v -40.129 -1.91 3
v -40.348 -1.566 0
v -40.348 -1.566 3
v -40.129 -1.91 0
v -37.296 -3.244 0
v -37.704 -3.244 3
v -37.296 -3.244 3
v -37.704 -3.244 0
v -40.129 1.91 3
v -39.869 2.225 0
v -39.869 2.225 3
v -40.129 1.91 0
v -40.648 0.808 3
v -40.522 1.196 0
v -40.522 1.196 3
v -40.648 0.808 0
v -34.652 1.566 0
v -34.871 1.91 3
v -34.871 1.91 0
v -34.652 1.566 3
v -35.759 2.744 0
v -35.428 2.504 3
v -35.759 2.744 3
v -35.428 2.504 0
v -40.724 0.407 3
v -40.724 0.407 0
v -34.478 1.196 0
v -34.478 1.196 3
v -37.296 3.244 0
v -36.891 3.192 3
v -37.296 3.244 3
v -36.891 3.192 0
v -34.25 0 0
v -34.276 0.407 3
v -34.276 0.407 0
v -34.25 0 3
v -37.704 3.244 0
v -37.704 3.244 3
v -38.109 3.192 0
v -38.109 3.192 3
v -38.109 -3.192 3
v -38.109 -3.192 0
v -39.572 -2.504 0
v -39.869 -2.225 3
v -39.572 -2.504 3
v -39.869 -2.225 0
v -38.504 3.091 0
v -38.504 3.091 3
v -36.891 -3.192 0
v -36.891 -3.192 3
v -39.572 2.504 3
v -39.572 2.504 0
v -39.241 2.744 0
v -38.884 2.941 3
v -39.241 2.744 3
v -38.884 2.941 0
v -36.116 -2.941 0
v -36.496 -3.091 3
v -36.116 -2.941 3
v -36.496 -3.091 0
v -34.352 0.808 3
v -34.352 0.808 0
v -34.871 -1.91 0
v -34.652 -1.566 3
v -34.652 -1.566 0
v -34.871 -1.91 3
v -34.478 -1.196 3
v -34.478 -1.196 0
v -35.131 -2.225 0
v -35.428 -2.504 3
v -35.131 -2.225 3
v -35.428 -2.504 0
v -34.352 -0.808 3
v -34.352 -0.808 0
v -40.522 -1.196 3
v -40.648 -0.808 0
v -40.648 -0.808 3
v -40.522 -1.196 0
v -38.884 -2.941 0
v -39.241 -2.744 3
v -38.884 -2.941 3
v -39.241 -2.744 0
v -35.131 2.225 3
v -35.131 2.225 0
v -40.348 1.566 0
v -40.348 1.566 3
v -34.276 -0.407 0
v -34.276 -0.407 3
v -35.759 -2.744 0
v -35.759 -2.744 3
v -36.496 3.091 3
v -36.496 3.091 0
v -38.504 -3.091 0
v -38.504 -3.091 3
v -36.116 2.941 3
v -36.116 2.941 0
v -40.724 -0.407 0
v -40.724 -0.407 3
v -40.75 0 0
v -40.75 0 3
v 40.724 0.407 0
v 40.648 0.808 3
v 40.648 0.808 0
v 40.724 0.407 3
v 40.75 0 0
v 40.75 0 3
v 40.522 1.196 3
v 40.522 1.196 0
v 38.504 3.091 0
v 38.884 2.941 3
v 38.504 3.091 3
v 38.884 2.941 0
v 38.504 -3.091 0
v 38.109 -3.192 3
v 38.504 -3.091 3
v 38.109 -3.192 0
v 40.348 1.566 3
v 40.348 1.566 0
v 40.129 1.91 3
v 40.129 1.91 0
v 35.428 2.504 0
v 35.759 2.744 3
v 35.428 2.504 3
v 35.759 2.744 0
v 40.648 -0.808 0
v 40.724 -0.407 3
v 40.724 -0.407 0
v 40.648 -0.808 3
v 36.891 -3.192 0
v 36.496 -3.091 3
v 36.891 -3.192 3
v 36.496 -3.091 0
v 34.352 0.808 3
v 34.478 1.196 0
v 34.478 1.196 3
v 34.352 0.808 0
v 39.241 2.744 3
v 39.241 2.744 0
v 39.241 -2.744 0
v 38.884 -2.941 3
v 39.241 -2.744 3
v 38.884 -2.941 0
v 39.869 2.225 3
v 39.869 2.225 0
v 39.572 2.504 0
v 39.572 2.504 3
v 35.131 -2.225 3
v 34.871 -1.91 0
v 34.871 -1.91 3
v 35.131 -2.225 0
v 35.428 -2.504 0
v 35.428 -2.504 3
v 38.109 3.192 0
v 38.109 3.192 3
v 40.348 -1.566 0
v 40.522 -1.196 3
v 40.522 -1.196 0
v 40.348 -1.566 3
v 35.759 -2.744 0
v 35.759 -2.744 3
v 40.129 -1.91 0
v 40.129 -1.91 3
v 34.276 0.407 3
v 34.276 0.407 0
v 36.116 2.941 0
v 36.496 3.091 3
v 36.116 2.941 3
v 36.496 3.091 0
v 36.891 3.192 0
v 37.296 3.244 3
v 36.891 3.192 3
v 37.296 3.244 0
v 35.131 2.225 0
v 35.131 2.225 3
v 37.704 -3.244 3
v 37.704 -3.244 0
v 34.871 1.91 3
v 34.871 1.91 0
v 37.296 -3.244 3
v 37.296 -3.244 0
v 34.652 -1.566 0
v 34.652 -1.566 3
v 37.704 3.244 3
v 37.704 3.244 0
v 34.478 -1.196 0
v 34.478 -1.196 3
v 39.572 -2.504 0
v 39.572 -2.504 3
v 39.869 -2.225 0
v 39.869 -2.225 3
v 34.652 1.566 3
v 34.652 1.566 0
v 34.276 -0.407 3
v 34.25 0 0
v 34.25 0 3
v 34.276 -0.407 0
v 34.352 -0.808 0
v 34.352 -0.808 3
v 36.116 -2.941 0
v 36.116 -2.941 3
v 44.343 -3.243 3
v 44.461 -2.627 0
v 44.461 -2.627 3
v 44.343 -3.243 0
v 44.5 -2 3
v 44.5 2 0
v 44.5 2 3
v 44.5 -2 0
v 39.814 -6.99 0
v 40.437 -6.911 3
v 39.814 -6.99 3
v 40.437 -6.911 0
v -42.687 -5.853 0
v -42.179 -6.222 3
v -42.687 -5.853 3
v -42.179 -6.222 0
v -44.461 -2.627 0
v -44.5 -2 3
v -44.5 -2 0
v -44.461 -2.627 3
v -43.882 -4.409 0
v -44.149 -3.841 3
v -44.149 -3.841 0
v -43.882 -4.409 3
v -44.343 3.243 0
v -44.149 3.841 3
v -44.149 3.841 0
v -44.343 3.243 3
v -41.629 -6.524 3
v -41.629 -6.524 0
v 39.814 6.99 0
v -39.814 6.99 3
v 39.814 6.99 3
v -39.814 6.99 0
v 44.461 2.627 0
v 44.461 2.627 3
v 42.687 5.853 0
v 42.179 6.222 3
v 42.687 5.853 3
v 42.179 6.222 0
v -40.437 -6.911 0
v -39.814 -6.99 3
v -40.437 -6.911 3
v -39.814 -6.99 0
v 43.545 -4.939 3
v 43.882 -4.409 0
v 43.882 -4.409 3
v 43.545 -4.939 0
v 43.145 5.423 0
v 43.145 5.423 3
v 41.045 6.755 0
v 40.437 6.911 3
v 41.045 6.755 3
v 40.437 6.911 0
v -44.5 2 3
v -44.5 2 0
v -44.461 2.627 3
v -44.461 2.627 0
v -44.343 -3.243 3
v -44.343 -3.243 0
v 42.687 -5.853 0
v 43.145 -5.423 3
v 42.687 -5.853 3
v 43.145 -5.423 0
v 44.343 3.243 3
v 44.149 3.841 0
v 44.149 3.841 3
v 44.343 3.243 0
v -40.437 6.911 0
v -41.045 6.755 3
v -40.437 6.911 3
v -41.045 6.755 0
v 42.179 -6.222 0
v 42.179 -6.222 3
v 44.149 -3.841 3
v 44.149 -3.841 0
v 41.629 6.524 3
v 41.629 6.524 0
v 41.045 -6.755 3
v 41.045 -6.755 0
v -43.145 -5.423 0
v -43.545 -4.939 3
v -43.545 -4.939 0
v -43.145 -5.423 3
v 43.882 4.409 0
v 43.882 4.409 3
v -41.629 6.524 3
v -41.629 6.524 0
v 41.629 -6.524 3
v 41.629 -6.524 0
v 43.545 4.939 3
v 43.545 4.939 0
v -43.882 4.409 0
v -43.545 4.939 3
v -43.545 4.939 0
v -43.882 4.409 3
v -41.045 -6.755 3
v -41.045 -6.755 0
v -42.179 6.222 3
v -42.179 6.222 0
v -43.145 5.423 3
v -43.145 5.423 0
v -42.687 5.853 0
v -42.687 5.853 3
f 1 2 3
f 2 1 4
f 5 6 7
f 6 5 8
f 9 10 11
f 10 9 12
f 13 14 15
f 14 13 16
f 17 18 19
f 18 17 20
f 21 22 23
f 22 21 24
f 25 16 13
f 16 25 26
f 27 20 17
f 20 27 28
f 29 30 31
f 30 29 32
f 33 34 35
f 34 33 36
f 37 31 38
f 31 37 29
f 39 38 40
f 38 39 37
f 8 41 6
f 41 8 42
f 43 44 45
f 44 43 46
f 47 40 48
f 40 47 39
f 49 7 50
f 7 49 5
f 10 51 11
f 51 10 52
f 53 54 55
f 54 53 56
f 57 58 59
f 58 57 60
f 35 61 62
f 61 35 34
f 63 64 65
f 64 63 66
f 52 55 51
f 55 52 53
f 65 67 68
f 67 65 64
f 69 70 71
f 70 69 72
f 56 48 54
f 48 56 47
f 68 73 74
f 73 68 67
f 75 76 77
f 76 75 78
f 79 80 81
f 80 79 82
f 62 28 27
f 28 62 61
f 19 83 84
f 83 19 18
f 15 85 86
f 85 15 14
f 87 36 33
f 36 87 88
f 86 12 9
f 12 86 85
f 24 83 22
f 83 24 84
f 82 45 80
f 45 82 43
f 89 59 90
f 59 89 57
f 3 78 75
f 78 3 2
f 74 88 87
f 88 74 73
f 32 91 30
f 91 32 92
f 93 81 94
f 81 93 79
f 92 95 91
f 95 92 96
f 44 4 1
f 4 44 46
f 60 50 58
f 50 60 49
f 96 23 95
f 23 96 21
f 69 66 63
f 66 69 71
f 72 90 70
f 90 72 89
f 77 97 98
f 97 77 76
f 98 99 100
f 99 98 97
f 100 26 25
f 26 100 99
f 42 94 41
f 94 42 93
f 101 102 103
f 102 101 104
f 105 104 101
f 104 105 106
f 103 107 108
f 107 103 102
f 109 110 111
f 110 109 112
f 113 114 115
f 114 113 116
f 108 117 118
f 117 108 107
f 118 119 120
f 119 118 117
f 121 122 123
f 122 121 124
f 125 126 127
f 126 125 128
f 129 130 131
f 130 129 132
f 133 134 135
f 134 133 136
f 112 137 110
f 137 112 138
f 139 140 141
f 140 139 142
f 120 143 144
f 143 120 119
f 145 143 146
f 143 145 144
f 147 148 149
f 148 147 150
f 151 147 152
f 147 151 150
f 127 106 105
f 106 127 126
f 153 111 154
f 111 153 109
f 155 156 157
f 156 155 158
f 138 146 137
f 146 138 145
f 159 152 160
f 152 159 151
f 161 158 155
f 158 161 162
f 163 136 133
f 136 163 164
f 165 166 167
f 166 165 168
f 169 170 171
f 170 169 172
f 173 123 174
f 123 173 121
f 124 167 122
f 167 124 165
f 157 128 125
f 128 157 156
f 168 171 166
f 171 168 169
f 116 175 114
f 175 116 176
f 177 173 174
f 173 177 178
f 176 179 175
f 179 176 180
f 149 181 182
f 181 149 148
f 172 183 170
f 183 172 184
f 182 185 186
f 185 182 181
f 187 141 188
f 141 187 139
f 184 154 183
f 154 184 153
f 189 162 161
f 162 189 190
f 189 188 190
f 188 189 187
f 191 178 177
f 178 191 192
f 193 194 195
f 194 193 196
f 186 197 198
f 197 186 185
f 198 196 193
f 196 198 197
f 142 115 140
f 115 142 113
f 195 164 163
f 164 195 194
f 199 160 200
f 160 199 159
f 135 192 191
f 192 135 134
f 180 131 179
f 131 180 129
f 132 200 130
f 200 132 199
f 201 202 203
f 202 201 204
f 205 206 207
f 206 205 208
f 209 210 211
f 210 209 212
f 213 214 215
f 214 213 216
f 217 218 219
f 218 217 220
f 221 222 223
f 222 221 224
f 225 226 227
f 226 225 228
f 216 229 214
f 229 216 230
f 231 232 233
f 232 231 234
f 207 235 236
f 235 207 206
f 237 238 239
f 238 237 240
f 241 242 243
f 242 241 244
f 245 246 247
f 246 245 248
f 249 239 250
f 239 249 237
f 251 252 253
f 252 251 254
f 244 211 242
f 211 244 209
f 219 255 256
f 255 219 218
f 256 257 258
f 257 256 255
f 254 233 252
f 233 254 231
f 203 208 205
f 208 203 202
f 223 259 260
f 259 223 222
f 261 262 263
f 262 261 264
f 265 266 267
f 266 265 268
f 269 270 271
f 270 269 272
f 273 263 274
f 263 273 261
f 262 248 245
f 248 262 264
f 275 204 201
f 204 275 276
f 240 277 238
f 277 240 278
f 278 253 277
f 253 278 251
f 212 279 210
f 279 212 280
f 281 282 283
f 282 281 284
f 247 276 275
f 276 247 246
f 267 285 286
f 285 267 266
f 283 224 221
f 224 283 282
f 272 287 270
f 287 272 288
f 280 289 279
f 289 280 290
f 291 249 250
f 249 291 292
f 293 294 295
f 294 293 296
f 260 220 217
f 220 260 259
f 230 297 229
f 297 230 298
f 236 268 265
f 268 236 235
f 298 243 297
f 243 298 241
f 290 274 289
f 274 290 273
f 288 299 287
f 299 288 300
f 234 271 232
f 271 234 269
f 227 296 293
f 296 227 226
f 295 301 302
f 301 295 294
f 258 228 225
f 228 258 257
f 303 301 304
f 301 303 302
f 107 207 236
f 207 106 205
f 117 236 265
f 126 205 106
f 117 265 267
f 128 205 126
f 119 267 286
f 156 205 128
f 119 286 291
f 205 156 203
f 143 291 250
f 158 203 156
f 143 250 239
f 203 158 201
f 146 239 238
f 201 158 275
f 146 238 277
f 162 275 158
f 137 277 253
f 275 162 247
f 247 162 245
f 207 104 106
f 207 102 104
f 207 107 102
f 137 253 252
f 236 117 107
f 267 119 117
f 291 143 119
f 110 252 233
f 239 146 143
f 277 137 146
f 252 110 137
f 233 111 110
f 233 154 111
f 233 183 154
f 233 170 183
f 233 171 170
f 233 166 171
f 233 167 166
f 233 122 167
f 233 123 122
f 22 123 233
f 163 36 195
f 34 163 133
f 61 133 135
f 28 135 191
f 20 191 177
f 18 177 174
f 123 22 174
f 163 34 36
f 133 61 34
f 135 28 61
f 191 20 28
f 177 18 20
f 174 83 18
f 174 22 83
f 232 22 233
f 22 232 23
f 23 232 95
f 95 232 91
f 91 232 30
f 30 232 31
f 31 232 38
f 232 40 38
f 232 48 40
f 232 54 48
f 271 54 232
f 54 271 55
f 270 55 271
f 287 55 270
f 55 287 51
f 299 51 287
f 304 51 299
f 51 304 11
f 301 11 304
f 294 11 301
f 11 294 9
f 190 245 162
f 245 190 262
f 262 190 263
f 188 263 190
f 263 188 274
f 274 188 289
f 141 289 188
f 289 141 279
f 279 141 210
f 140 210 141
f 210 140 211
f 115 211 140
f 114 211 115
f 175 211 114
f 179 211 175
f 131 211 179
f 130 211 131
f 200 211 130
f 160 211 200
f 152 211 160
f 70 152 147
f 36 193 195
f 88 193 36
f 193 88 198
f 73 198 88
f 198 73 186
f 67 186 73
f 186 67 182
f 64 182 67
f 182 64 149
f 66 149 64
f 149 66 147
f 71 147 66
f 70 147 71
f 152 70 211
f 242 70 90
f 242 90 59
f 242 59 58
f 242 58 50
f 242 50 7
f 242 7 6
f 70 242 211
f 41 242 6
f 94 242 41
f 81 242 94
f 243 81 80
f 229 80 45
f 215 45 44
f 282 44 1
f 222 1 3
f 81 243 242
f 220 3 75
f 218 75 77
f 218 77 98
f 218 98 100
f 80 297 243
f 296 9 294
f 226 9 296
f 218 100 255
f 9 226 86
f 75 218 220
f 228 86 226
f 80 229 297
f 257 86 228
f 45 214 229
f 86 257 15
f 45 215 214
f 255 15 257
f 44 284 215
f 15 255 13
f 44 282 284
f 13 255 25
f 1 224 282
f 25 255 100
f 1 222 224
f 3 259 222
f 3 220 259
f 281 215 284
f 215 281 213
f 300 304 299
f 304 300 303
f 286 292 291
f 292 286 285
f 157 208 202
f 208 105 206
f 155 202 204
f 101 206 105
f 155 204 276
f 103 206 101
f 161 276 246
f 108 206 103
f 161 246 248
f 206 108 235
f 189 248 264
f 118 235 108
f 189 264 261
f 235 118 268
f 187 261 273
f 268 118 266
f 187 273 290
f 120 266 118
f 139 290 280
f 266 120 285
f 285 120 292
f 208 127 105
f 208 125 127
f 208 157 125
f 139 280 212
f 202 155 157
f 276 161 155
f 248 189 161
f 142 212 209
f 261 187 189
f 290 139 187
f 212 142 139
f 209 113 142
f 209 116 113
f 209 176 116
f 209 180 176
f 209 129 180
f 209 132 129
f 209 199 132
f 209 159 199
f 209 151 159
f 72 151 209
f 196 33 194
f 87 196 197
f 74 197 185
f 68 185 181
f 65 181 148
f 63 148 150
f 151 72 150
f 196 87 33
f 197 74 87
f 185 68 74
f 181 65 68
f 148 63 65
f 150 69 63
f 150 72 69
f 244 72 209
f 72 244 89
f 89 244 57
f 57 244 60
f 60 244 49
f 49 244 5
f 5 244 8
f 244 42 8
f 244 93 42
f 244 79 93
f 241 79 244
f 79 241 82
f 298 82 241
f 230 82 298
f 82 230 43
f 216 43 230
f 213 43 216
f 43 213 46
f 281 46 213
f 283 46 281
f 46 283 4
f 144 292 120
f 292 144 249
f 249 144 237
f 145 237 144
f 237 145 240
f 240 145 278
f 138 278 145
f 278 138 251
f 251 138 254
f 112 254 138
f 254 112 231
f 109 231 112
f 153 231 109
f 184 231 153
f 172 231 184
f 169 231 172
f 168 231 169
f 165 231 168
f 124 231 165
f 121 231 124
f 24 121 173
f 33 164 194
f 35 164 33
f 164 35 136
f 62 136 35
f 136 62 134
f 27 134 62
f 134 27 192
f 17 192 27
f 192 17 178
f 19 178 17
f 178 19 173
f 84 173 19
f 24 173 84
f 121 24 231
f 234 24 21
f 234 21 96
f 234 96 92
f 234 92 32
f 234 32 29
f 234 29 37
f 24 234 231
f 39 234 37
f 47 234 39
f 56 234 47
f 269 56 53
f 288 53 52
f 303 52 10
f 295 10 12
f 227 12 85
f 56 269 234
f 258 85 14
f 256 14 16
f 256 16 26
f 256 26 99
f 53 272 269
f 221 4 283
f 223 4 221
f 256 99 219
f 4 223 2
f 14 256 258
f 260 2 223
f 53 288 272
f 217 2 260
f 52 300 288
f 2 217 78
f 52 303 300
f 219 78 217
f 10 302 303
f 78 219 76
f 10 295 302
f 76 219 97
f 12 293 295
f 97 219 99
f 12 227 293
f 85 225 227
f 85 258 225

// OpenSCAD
$fn = 50;


difference() {
	union() {
		hull() {
			translate(v = [-39.5000000000, 2.0000000000, 0]) {
				cylinder(h = 3, r = 5);
			}
			translate(v = [39.5000000000, 2.0000000000, 0]) {
				cylinder(h = 3, r = 5);
			}
			translate(v = [-39.5000000000, -2.0000000000, 0]) {
				cylinder(h = 3, r = 5);
			}
			translate(v = [39.5000000000, -2.0000000000, 0]) {
				cylinder(h = 3, r = 5);
			}
		}
	}
	union() {
		translate(v = [-37.5000000000, 0.0000000000, -100.0000000000]) {
			cylinder(h = 200, r = 3.2500000000);
		}
		translate(v = [-37.5000000000, 0.0000000000, -100.0000000000]) {
			cylinder(h = 200, r = 3.2500000000);
		}
		translate(v = [37.5000000000, 0.0000000000, -100.0000000000]) {
			cylinder(h = 200, r = 3.2500000000);
		}
		translate(v = [37.5000000000, 0.0000000000, -100.0000000000]) {
			cylinder(h = 200, r = 3.2500000000);
		}
	}
}
